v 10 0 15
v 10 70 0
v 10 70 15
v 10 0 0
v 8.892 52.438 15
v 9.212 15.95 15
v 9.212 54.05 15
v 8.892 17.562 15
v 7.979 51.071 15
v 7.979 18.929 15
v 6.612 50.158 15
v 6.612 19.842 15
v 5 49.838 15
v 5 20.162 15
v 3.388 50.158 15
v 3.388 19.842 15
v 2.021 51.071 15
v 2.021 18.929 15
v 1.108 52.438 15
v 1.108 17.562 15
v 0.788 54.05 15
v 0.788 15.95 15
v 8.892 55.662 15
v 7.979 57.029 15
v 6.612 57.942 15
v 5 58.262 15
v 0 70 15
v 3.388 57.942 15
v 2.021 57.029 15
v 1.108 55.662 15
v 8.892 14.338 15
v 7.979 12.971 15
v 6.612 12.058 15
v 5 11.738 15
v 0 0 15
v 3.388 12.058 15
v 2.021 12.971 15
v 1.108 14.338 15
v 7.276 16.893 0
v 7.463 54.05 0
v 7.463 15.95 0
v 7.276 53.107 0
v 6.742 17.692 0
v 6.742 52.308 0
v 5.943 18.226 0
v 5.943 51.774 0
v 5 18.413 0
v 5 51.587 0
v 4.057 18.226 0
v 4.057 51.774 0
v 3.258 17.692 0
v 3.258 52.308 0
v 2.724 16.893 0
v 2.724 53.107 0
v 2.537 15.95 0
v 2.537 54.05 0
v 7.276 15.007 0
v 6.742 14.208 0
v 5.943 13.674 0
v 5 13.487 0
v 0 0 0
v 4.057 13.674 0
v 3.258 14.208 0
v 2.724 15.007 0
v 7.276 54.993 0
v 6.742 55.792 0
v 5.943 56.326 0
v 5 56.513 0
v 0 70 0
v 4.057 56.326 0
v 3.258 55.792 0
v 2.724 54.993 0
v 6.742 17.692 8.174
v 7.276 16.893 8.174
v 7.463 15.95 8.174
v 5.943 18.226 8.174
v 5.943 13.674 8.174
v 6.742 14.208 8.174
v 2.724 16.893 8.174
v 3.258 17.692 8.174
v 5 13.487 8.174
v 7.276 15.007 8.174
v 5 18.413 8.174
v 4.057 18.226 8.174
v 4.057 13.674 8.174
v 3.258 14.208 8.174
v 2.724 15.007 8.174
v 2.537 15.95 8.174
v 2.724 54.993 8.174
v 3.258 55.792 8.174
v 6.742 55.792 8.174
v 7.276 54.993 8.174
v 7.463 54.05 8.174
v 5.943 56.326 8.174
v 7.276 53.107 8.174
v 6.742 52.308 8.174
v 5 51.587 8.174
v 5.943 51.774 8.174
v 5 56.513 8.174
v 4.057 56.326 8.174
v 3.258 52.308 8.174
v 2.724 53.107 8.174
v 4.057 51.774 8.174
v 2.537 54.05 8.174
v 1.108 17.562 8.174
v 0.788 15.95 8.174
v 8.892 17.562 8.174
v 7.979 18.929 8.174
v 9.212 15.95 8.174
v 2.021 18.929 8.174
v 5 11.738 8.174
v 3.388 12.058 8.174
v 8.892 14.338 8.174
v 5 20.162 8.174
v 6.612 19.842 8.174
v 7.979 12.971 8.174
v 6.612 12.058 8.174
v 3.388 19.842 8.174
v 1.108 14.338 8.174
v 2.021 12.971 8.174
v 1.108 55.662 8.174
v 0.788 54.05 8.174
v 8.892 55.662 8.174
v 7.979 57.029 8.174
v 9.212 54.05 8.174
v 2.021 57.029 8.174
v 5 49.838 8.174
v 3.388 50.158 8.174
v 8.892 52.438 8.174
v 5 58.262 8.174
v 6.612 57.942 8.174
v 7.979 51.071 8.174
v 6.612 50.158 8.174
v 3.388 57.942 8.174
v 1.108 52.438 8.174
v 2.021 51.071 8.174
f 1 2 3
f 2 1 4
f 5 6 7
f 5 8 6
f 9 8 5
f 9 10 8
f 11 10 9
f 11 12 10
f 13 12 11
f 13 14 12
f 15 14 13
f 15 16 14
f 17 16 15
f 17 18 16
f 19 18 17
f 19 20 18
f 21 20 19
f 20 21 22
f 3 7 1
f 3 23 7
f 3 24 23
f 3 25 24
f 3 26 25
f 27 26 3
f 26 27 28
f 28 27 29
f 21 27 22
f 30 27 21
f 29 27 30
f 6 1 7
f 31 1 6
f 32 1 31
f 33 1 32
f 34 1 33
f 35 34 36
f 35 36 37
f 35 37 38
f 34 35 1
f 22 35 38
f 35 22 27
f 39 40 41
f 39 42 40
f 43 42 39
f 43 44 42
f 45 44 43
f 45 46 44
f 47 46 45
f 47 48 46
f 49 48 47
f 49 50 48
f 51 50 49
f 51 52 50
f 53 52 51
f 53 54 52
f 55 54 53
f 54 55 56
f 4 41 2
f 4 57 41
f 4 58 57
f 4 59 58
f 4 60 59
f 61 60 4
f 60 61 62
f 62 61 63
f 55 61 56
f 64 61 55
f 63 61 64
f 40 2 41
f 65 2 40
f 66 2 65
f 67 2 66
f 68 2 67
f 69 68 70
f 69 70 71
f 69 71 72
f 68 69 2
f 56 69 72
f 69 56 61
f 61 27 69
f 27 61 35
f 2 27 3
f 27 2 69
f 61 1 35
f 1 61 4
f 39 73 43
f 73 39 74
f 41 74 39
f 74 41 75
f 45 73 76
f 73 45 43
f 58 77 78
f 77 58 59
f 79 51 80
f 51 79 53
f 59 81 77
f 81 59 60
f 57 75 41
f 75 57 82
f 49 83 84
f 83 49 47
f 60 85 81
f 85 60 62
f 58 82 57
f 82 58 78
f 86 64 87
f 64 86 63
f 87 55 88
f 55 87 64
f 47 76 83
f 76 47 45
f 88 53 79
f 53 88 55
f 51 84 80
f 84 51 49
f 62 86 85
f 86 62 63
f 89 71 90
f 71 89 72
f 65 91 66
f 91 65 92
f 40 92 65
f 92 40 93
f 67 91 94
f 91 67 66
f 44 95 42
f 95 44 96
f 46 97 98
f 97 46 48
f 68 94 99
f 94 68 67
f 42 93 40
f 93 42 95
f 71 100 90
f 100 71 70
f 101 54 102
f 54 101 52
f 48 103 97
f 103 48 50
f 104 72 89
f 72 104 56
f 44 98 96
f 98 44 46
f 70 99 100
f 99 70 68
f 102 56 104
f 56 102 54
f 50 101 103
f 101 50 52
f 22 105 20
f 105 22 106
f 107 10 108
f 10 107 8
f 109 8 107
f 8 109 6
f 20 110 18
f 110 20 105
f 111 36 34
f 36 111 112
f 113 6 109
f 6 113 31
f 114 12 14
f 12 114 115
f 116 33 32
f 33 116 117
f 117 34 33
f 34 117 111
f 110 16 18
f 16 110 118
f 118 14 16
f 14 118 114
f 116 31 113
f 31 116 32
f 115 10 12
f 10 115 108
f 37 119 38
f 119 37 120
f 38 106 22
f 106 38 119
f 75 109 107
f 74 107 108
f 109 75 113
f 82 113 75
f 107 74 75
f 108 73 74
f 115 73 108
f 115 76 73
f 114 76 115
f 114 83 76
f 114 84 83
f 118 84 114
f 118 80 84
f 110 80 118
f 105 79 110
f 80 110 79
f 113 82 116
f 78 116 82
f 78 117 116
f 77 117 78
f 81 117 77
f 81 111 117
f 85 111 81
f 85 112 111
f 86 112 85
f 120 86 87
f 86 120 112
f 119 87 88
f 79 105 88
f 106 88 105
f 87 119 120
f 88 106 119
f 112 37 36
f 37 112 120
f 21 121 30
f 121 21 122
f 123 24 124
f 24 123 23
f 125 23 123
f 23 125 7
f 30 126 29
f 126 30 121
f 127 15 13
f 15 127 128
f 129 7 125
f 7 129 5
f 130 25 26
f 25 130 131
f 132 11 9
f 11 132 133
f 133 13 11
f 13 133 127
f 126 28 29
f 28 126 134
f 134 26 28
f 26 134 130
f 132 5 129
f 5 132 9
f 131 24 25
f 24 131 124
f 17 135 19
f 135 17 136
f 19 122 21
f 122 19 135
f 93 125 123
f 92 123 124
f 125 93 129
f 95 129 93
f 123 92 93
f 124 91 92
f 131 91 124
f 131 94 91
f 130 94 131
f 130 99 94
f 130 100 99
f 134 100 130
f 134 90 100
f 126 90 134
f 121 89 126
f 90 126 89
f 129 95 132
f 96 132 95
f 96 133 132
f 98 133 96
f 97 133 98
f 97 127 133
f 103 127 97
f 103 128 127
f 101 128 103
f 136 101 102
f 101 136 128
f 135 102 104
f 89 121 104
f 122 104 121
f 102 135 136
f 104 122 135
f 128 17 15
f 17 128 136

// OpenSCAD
// file: grid.scad
/* This module creates grids. */

module grid(
   gridX, 
   gridY, 
   borderX, 
   borderY, 
   meshSolid,    // width of solid part of grid
   meshSpace,    // width of space part of grid
   thickness) {  // z height 

   /* Calculate the size of the dimensions of the meshed area. */
   meshX=gridX-(borderX*2);
   meshY=gridY-(borderY*2);

   echo (meshX,  meshY);

   /* Calculate the number of lines in the meshed area. */
   nX=floor(meshX/(meshSolid+meshSpace));
   nY=floor(meshY/(meshSolid+meshSpace));
   gridSize = meshSolid + meshSpace;
   echo (nX, nY, gridSize);


   intersection () {

      union() {
         /* 
          *  Draw the border box centered. 
          */
         difference() {
            cube (size=[gridX,gridY,thickness+ 2], center=true);
            cube (size=[meshX,meshY,thickness+ 2], center=true);
         } /* enddifference */
         
      
         /* 
          *  Draw the grid centered. 
          */
      
         /* Draw the lines parallel to y axis. */
         translate([-1 * (meshSolid / 2), 0, -1 * (thickness / 2)])
            union() {
               for (i = [0 : ceil(nX / 2)]) {
                  translate([i*(meshSolid+meshSpace), -1 * (gridY / 2), 0]) 
                     cube(size=[meshSolid, gridY, thickness]);
               } /* endfor */
               for (i = [0 : ceil(nX / 2)]) {
                  translate([-1 * i*(meshSolid+meshSpace), -1 * (gridY / 2), 0]) 
                     cube(size=[meshSolid, gridY, thickness]);
               } /* endfor */
            } /* endunion */
         
         /* Draw the lines parallel to the x axis. */
         translate([0, -1 * (meshSolid / 2), -1 * (thickness / 2)])
            union() {
               for (i = [0 : ceil(nY / 2)]) {
                  translate([-1 * (gridX / 2), i*(meshSolid+meshSpace), 0]) 
                     cube(size=[gridX, meshSolid, thickness]);
               } /* endfor */
               for (i = [0 : ceil(nY / 2)]) {
                  translate([-1 * (gridX / 2), -1 * i*(meshSolid+meshSpace), 0]) 
                     cube(size=[gridX, meshSolid, thickness]);
               } /* endfor */
            } /* endunion */
      } /* endunion */

      /* Slice off all the extra line widths on the edges. */
      cube (size=[gridX,gridY,thickness], center=true);

   } /* endintersection */

} /* endmodule */


grid(21, 41, 0, 0, 2, 8, 5);
   
// main file
/* This is a jig for holding the rpi door controller PCB
   on a Sherline 5000 mill for isolation milling.  */
use <MCAD/nuts_and_bolts.scad>;
use <grid.scad>;

$fn = 16;

/* Set overall piece dimensions. */
x = 148;
y = 70;
z = 15;
x_border = 10;
y_border = 10;
grid_size = 20;
grid_line_width = 1;

/* The grid pocket is how much to drop the top of the grid by.  This
   allows for some padding to be added underneath the circuit board. */
grid_pocket = 3;


/* Set the screw size in mm. */
screw_size = 4.1;

/* 
 *  Set the mounting bolt dimensions. 
 */

/* Use a #10 socket head cap screw. */
bolt_dia = (0.19 * 25.4) + 0.1; 
bolt_head_dia = (0.312 * 25.4) + 0.5;   
bolt_head_height = (0.19 * 25.4) + 2;

/* Set the distance between mounting holes. */
mount_hole_dist = (1.5 * 25.4); // 1.5 in



/****** Calculated Values *******/
mount_hole_x_offset = x_border / 2; 


difference() {

   cube(size=[x_border, y, z]);
   
   /* 
    *  Add some holes for the #10 socket head cap screws that
    *  attach the plate to the base. 
    */
  

   /* Subtract the bolt holes. */
   translate([mount_hole_x_offset, 
              (y / 2) - (mount_hole_dist / 2), 
              0])
      cylinder(h = z, r = bolt_dia / 2);
   translate([mount_hole_x_offset, 
              (y / 2) + (mount_hole_dist / 2), 
              0])
      cylinder(h = z, r = bolt_dia / 2);



   /* Subtract the bolt head holes. */
   translate([mount_hole_x_offset, 
              (y / 2) - (mount_hole_dist / 2), 
              z - bolt_head_height])
      cylinder(h = z, r = bolt_head_dia / 2);
   translate([mount_hole_x_offset, 
              (y / 2) + (mount_hole_dist / 2), 
              z - bolt_head_height])
      cylinder(h = z, r = bolt_head_dia / 2);

} /* enddifference */
